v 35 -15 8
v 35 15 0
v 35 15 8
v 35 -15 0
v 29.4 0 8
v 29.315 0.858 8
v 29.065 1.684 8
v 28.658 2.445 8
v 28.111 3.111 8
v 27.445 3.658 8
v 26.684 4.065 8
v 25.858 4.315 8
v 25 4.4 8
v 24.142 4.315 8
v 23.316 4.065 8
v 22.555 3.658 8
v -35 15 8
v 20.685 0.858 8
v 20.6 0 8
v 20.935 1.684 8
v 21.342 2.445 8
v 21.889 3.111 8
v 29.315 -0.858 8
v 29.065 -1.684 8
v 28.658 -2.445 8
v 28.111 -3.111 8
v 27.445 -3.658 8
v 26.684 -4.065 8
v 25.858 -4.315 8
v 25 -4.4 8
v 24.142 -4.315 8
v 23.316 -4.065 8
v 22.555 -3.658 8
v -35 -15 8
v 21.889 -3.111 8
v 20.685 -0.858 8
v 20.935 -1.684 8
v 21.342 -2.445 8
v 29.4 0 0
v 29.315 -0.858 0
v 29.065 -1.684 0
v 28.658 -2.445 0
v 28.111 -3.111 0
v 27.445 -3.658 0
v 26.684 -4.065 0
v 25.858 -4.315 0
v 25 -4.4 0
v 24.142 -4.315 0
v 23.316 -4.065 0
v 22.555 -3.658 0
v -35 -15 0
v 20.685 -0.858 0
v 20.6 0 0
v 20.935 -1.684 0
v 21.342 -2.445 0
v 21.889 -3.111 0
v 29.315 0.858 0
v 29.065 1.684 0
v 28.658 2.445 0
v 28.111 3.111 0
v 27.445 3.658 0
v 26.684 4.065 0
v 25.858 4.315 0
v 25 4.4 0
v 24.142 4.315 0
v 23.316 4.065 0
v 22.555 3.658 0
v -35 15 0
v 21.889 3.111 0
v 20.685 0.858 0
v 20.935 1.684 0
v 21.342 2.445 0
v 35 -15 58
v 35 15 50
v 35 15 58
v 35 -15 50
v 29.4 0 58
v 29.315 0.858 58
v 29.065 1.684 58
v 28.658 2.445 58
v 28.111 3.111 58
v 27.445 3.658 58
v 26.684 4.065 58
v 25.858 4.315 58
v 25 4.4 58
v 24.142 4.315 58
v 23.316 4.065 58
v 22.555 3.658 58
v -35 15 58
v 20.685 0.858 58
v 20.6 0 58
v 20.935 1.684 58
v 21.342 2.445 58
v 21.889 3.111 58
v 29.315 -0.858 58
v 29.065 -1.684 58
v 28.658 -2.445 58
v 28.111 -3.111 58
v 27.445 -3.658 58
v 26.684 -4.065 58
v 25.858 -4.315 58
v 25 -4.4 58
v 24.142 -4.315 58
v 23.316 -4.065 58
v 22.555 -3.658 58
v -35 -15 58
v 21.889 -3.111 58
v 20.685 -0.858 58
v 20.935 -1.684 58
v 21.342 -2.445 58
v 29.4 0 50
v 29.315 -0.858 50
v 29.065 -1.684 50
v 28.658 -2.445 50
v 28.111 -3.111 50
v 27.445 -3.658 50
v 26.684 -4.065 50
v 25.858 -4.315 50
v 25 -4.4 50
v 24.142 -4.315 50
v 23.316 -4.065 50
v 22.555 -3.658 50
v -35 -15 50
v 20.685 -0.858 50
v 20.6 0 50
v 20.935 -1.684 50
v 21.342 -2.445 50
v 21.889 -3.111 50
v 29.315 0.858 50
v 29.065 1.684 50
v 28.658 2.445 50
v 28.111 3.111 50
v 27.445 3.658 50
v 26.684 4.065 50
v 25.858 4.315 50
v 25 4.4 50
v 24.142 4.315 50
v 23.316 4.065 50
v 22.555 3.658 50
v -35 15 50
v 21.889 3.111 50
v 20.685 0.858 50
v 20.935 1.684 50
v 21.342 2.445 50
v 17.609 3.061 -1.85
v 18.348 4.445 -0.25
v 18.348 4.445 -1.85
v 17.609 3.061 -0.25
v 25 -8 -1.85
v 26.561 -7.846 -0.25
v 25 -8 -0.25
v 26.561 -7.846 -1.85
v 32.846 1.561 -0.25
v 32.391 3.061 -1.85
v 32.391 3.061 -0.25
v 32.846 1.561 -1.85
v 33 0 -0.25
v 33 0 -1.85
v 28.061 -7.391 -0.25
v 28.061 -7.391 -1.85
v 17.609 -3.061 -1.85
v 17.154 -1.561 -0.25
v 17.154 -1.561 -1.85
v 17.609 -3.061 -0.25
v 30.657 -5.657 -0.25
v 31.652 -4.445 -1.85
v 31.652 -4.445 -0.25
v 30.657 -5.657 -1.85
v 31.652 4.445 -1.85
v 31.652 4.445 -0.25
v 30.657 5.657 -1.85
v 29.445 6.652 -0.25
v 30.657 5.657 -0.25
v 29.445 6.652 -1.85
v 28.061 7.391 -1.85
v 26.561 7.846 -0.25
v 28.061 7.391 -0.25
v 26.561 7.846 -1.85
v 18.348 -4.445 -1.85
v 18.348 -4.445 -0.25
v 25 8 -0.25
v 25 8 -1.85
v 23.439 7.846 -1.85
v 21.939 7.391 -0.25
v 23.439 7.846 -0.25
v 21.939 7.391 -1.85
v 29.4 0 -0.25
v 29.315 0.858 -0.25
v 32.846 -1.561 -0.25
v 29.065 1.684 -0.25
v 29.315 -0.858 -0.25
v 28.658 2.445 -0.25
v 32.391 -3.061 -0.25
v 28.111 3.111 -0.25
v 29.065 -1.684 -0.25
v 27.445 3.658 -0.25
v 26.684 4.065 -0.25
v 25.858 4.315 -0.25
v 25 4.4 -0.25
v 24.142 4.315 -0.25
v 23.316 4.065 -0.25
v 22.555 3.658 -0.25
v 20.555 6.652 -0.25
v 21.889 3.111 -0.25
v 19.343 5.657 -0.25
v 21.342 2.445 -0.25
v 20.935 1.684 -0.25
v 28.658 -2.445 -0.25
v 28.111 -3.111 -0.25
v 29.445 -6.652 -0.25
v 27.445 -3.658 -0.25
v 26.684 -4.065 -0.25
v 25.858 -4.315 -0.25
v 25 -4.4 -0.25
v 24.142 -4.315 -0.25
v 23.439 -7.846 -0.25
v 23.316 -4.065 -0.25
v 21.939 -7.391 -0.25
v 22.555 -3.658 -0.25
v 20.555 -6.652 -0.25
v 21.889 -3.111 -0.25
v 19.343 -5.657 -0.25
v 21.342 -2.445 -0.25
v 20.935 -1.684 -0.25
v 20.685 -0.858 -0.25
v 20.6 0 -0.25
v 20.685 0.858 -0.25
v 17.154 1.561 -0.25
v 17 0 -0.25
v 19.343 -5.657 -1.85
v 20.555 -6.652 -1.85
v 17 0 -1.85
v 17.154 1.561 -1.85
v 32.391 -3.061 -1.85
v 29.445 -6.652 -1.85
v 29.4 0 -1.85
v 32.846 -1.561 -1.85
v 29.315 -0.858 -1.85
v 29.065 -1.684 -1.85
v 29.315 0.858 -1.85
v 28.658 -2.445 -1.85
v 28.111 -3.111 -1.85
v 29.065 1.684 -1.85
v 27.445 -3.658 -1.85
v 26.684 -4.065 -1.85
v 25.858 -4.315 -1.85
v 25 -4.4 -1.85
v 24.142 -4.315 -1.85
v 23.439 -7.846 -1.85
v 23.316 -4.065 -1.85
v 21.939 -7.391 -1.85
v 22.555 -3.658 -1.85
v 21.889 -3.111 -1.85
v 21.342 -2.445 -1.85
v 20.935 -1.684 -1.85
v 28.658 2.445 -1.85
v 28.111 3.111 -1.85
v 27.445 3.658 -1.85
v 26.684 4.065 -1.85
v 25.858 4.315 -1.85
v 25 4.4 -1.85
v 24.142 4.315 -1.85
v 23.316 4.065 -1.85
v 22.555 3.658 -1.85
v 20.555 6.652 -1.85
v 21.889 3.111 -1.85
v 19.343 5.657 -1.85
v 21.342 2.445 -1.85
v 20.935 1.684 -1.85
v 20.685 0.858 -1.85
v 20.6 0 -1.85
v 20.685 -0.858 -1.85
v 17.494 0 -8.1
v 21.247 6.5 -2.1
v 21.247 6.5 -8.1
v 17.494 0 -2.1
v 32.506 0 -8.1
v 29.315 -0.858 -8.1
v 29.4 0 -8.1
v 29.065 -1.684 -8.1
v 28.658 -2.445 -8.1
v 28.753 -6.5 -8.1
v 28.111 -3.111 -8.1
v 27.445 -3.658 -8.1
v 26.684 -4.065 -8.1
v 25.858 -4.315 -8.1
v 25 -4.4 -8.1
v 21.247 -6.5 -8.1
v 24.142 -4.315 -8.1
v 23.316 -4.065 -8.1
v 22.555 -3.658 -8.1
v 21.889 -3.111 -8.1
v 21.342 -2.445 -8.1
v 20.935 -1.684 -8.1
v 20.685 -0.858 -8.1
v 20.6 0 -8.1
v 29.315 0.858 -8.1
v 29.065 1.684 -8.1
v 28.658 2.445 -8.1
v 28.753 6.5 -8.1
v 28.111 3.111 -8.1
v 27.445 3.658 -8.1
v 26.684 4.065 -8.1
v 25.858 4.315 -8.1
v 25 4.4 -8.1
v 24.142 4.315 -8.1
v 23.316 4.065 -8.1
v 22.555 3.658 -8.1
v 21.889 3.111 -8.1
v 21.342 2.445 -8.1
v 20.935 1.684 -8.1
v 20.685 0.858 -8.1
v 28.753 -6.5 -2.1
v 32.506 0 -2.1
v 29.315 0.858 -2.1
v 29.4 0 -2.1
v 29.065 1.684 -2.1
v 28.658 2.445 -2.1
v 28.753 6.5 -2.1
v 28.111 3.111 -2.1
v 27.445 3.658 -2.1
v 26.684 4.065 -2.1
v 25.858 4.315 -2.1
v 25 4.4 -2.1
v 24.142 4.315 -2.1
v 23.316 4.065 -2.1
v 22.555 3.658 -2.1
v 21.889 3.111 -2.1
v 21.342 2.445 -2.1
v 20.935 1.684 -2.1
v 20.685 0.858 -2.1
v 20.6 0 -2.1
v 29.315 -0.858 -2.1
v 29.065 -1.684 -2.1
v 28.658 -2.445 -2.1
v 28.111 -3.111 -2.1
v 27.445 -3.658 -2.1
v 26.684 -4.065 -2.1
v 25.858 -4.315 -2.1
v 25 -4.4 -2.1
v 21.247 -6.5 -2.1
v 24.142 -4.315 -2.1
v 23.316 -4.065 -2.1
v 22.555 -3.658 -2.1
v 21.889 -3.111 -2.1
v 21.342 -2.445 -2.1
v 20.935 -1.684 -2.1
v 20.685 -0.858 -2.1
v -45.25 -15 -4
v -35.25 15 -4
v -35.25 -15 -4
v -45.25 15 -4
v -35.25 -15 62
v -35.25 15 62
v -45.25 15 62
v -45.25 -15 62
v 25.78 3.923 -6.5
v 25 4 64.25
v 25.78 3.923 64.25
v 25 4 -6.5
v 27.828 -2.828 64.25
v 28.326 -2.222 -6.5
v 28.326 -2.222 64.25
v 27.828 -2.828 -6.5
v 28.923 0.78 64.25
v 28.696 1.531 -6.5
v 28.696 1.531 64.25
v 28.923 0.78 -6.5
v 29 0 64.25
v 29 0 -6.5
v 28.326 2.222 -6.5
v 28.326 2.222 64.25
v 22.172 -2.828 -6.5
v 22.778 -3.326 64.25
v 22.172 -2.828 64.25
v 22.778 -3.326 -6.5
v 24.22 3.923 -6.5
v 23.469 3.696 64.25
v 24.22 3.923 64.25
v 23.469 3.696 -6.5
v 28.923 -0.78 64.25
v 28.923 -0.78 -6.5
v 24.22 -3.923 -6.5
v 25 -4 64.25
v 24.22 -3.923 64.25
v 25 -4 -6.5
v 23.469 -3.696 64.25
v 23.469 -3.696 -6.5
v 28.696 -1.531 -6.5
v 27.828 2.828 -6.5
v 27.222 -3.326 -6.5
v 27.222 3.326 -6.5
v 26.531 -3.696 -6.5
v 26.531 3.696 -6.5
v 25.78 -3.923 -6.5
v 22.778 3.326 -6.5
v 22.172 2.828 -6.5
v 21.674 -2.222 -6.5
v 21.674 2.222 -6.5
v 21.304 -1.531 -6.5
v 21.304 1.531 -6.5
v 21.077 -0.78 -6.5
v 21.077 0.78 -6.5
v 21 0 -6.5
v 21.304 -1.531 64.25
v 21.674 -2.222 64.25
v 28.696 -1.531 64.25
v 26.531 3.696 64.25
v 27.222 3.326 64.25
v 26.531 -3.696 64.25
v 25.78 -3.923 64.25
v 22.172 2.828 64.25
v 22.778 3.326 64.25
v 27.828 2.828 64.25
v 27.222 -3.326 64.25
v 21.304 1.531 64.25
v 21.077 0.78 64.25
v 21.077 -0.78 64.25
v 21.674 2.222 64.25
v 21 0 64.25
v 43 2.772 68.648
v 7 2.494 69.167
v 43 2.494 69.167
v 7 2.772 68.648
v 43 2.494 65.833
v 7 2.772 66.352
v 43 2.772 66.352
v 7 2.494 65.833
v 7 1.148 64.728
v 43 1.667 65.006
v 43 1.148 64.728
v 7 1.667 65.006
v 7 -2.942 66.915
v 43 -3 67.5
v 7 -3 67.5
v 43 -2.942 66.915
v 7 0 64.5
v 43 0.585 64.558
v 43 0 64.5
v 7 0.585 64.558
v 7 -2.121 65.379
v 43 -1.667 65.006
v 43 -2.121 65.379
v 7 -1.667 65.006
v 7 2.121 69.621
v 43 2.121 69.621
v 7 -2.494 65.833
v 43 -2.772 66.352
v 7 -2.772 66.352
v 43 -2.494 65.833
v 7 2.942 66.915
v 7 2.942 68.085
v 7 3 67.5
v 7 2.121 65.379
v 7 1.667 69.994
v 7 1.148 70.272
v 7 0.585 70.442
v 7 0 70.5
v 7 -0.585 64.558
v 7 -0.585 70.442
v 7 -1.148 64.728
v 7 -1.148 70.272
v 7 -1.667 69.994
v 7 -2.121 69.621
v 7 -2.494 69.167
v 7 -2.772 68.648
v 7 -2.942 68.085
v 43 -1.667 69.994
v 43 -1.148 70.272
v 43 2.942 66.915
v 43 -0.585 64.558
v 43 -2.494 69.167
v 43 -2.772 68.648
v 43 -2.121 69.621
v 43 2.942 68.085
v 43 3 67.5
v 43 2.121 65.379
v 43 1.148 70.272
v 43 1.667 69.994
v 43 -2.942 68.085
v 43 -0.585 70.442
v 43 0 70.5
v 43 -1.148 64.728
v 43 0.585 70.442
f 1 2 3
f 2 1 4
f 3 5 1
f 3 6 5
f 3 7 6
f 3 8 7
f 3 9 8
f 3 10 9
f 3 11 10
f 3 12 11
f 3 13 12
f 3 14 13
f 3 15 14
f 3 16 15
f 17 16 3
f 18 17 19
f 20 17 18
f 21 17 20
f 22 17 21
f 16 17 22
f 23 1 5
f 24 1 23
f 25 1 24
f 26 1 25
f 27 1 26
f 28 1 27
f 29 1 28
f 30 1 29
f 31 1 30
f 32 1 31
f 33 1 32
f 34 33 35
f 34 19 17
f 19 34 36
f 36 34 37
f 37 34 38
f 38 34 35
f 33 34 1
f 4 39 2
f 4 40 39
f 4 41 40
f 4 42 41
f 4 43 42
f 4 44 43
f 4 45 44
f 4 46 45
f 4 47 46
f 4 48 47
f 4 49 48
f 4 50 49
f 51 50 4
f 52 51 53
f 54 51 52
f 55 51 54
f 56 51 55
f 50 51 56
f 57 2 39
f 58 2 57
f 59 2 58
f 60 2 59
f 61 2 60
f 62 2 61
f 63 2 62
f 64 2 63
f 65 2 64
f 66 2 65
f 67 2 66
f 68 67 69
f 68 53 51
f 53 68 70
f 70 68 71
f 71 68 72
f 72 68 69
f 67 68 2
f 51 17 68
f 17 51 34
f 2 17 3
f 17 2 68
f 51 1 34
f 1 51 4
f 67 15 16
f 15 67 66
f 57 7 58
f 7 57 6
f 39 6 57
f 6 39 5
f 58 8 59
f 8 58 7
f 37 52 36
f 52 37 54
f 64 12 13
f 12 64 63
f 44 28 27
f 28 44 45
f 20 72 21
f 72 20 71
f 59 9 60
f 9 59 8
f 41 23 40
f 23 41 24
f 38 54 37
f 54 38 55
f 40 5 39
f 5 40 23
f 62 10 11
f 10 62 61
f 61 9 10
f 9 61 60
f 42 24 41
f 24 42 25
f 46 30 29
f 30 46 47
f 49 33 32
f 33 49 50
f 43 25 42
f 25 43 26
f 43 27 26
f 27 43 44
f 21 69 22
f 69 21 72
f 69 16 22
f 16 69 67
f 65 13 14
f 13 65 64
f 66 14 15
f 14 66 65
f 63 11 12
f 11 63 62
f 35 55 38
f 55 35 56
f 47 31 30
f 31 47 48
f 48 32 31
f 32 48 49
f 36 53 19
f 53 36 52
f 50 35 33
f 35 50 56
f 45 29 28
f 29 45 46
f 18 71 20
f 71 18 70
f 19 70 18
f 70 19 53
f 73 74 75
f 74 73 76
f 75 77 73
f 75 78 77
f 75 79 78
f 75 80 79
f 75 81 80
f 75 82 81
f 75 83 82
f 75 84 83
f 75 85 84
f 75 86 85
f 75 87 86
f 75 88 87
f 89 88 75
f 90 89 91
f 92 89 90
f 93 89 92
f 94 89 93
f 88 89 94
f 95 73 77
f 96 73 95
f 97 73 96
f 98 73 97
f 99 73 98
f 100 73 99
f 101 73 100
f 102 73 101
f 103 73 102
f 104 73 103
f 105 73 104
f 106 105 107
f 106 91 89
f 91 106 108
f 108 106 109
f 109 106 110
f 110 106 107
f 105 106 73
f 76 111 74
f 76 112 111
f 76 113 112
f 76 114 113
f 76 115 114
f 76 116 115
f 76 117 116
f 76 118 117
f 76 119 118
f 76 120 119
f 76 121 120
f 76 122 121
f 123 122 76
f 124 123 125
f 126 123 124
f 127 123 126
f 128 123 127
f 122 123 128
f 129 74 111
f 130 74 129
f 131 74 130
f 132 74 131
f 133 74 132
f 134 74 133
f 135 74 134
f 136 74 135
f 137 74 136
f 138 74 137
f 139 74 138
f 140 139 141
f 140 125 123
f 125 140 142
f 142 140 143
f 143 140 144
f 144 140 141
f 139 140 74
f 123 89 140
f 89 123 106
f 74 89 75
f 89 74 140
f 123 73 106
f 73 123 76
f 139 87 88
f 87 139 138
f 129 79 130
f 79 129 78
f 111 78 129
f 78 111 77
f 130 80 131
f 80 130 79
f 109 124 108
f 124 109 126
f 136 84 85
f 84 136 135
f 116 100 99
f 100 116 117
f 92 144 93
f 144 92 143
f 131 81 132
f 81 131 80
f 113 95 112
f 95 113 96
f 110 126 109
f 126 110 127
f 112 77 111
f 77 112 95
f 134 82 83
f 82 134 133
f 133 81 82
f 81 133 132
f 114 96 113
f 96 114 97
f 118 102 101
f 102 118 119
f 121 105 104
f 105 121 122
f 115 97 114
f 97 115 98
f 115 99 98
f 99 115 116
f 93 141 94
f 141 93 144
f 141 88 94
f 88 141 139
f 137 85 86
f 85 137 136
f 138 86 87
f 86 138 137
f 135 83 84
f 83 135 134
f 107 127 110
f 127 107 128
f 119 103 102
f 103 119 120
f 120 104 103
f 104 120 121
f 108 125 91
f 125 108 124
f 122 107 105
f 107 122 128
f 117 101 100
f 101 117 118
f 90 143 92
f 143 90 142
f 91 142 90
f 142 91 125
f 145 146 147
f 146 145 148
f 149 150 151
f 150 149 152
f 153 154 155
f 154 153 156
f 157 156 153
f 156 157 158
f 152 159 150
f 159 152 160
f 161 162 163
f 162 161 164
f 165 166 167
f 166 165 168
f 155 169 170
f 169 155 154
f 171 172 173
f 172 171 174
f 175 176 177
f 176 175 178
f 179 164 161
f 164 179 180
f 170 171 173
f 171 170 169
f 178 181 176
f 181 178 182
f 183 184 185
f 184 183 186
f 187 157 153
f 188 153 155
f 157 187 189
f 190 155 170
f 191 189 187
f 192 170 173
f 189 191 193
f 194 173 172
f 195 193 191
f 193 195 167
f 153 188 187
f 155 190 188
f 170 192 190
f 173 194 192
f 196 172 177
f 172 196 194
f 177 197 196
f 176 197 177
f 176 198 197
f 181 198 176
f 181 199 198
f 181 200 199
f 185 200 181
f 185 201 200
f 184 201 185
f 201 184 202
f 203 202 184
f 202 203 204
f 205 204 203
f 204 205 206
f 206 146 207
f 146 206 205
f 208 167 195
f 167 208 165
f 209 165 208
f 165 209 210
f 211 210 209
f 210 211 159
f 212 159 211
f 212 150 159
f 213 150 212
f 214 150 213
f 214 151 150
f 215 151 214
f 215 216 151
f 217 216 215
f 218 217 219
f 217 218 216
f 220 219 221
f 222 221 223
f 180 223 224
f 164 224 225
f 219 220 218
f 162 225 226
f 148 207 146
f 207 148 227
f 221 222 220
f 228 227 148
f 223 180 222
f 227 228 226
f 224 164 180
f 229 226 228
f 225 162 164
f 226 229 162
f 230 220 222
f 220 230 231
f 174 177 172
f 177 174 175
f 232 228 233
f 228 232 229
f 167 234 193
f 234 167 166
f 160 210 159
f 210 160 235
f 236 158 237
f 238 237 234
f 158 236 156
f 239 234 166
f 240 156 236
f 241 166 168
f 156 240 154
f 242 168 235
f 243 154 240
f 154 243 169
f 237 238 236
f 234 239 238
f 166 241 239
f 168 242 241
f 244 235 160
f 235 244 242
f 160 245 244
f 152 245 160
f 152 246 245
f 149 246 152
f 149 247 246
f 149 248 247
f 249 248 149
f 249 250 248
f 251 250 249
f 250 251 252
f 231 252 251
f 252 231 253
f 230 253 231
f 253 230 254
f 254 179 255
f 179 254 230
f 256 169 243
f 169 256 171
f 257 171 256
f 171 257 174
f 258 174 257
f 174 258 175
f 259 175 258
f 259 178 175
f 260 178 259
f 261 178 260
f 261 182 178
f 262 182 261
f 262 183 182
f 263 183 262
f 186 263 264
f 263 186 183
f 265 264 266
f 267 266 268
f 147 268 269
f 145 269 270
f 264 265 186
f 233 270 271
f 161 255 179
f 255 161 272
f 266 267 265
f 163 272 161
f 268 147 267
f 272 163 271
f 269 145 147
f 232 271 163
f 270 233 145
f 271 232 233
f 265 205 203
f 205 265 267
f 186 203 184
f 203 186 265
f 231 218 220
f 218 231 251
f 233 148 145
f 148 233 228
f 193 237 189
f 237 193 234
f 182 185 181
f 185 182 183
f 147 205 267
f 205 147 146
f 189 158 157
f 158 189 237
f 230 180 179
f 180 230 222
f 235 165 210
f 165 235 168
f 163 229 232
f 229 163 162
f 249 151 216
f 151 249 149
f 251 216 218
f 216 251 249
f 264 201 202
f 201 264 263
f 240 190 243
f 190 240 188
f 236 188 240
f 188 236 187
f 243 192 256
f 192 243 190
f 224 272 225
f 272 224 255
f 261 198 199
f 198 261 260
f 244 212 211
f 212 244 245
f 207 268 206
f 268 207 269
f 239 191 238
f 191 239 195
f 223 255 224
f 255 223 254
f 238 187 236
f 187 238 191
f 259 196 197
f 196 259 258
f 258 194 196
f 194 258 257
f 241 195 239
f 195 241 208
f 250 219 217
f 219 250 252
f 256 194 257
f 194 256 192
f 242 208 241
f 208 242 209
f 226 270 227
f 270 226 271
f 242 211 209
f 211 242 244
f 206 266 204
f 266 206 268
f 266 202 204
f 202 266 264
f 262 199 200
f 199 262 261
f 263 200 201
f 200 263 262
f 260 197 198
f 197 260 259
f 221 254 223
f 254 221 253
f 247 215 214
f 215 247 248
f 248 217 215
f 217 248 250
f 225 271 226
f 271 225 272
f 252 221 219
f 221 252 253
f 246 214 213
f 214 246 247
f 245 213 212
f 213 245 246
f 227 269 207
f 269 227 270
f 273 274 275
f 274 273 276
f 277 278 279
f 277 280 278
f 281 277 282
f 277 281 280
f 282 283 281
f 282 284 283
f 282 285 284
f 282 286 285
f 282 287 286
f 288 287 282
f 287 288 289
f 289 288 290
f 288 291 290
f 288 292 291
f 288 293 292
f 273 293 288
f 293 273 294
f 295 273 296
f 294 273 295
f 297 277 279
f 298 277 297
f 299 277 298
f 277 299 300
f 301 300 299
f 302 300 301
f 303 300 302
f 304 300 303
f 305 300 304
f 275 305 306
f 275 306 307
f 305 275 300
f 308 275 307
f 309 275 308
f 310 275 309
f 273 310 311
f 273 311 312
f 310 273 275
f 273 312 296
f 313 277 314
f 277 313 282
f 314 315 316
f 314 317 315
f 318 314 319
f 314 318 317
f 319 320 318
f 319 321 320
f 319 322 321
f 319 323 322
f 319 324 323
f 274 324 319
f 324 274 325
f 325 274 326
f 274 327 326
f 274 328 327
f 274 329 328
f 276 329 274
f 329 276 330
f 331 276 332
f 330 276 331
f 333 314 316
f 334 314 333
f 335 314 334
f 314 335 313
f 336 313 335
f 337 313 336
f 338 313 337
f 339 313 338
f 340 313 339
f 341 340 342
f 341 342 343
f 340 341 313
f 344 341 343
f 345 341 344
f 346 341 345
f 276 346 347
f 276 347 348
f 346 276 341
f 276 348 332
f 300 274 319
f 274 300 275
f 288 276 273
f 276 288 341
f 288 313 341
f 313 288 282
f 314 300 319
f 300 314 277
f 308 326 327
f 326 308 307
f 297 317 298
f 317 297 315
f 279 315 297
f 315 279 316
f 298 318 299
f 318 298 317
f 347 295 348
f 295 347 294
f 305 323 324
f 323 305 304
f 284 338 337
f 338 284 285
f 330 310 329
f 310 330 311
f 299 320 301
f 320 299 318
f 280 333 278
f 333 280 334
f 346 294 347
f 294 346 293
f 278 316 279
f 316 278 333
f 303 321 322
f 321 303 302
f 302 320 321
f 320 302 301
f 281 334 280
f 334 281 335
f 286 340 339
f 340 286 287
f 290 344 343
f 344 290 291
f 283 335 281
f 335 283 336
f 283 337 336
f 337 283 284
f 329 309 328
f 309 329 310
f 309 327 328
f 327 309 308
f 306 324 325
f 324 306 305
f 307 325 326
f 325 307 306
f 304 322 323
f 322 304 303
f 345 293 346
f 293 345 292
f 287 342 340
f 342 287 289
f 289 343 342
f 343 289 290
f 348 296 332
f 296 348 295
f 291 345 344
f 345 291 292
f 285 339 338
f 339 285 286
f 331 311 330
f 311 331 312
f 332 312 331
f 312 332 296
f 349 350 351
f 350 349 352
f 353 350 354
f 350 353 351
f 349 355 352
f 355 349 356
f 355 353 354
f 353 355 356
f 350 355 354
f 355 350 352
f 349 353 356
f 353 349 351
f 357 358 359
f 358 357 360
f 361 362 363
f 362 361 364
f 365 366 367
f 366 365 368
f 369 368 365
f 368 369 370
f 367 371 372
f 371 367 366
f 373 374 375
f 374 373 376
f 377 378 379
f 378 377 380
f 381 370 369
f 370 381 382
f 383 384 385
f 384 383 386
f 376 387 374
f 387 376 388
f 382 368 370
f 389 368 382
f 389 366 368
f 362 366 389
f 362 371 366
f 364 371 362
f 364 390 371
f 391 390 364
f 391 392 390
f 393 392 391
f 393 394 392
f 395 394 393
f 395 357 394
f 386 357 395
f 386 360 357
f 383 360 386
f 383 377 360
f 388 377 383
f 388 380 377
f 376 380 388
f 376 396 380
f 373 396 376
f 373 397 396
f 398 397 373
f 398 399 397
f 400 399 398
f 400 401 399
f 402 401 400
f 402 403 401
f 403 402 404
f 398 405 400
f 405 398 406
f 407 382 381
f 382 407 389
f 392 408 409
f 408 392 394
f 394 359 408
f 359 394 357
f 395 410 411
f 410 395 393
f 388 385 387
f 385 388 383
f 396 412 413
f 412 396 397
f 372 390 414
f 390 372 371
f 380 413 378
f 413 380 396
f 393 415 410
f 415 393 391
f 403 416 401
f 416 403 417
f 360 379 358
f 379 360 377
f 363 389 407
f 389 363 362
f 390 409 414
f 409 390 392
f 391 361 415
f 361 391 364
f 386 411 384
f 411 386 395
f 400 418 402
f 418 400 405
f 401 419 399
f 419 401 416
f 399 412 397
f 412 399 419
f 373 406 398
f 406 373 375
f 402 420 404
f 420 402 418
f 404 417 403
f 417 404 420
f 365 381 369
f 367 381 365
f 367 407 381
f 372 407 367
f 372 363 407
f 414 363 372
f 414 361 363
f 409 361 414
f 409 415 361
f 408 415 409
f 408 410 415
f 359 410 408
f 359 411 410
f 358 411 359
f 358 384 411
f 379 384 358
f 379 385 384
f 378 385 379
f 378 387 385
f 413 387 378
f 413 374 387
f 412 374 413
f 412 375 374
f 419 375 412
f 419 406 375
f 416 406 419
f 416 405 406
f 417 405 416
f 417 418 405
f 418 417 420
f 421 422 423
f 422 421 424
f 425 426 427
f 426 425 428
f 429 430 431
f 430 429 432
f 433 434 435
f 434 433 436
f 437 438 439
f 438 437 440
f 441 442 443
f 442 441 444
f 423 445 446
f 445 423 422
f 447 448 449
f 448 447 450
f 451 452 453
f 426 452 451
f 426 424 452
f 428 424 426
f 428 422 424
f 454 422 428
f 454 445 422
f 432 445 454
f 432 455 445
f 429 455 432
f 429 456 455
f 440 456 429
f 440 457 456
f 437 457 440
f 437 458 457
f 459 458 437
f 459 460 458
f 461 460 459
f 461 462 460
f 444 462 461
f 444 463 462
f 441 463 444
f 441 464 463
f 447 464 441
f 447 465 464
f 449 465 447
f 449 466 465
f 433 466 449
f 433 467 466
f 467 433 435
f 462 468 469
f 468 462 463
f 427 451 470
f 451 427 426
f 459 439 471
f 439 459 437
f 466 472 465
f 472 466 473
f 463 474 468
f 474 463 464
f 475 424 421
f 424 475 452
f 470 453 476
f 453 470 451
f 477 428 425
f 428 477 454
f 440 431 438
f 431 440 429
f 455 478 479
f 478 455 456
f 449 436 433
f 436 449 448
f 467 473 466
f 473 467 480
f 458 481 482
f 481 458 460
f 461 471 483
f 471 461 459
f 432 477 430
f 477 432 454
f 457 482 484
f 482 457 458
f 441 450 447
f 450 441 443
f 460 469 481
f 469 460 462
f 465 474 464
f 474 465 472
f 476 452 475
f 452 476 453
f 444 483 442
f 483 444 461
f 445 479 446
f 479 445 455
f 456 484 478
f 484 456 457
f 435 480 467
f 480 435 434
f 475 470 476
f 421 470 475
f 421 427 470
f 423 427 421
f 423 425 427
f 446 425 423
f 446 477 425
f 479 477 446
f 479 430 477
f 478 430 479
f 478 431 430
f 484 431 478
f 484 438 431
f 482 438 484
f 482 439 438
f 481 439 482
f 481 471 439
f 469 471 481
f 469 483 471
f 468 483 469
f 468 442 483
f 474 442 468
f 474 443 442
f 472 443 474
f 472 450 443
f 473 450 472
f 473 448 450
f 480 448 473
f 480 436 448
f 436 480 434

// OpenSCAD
$fn = 32;

// ------------------------------------------------------------------------
// C clamp: throat 50 mm, screw d8
// Every part is its own module, assembly() places every instance.
// ------------------------------------------------------------------------

// --- part 1 ---
module clamp_arm() {
  difference() {
    translate([-35, -15, 0]) cube([70, 30, 8]);
    translate([25, 0, -1]) cylinder(h = 10, d = 8.8);
  }
}

// --- part 2 ---
module clamp_spine() {
  difference() {
    translate([-33, -15, 0]) cube([66, 30, 10]);
  }
}

// --- part 3 ---
module clamp_screw() {
  translate([0, 0, -35.375]) cylinder(h = 70.75, d = 8);
}

// --- part 4 ---
module clamp_washer() {
  difference() {
      translate([0, 0, 0]) cylinder(h = 1.6, d = 16);
      translate([0, 0, -1]) cylinder(h = 3.6, d = 8.8);
    }
}

// --- part 5 ---
module clamp_nut() {
  difference() {
    linear_extrude(height = 6) polygon(points = [[7.506, 0], [3.753, 6.5], [-3.753, 6.5], [-7.506, 0], [-3.753, -6.5], [3.753, -6.5]]);
    translate([0, 0, -1]) cylinder(h = 8, d = 8.8);
  }
}

// --- part 6 ---
module tommy_bar() {
  translate([0, 0, -18]) cylinder(h = 36, d = 6);
}

// --- assembly ---
module assembly() {
  color([0.80, 0.24, 0.20]) translate([0, 0, 0]) rotate([0, 0, 0]) clamp_arm();
  color([0.20, 0.45, 0.75]) translate([0, 0, 50]) rotate([0, 0, 0]) clamp_arm();
  color([0.25, 0.62, 0.32]) translate([-45.25, 0, 29]) rotate([0, 90, 0]) clamp_spine();
  color([0.92, 0.70, 0.18]) translate([25, 0, 28.875]) rotate([0, 0, 0]) clamp_screw();
  color([0.58, 0.35, 0.70]) translate([25, 0, -1.85]) rotate([0, 0, 0]) clamp_washer();
  color([0.16, 0.66, 0.66]) translate([25, 0, -8.1]) rotate([0, 0, 0]) clamp_nut();
  color([0.85, 0.48, 0.18]) translate([25, 0, 67.5]) rotate([0, 90, 0]) tommy_bar();
}

assembly();
